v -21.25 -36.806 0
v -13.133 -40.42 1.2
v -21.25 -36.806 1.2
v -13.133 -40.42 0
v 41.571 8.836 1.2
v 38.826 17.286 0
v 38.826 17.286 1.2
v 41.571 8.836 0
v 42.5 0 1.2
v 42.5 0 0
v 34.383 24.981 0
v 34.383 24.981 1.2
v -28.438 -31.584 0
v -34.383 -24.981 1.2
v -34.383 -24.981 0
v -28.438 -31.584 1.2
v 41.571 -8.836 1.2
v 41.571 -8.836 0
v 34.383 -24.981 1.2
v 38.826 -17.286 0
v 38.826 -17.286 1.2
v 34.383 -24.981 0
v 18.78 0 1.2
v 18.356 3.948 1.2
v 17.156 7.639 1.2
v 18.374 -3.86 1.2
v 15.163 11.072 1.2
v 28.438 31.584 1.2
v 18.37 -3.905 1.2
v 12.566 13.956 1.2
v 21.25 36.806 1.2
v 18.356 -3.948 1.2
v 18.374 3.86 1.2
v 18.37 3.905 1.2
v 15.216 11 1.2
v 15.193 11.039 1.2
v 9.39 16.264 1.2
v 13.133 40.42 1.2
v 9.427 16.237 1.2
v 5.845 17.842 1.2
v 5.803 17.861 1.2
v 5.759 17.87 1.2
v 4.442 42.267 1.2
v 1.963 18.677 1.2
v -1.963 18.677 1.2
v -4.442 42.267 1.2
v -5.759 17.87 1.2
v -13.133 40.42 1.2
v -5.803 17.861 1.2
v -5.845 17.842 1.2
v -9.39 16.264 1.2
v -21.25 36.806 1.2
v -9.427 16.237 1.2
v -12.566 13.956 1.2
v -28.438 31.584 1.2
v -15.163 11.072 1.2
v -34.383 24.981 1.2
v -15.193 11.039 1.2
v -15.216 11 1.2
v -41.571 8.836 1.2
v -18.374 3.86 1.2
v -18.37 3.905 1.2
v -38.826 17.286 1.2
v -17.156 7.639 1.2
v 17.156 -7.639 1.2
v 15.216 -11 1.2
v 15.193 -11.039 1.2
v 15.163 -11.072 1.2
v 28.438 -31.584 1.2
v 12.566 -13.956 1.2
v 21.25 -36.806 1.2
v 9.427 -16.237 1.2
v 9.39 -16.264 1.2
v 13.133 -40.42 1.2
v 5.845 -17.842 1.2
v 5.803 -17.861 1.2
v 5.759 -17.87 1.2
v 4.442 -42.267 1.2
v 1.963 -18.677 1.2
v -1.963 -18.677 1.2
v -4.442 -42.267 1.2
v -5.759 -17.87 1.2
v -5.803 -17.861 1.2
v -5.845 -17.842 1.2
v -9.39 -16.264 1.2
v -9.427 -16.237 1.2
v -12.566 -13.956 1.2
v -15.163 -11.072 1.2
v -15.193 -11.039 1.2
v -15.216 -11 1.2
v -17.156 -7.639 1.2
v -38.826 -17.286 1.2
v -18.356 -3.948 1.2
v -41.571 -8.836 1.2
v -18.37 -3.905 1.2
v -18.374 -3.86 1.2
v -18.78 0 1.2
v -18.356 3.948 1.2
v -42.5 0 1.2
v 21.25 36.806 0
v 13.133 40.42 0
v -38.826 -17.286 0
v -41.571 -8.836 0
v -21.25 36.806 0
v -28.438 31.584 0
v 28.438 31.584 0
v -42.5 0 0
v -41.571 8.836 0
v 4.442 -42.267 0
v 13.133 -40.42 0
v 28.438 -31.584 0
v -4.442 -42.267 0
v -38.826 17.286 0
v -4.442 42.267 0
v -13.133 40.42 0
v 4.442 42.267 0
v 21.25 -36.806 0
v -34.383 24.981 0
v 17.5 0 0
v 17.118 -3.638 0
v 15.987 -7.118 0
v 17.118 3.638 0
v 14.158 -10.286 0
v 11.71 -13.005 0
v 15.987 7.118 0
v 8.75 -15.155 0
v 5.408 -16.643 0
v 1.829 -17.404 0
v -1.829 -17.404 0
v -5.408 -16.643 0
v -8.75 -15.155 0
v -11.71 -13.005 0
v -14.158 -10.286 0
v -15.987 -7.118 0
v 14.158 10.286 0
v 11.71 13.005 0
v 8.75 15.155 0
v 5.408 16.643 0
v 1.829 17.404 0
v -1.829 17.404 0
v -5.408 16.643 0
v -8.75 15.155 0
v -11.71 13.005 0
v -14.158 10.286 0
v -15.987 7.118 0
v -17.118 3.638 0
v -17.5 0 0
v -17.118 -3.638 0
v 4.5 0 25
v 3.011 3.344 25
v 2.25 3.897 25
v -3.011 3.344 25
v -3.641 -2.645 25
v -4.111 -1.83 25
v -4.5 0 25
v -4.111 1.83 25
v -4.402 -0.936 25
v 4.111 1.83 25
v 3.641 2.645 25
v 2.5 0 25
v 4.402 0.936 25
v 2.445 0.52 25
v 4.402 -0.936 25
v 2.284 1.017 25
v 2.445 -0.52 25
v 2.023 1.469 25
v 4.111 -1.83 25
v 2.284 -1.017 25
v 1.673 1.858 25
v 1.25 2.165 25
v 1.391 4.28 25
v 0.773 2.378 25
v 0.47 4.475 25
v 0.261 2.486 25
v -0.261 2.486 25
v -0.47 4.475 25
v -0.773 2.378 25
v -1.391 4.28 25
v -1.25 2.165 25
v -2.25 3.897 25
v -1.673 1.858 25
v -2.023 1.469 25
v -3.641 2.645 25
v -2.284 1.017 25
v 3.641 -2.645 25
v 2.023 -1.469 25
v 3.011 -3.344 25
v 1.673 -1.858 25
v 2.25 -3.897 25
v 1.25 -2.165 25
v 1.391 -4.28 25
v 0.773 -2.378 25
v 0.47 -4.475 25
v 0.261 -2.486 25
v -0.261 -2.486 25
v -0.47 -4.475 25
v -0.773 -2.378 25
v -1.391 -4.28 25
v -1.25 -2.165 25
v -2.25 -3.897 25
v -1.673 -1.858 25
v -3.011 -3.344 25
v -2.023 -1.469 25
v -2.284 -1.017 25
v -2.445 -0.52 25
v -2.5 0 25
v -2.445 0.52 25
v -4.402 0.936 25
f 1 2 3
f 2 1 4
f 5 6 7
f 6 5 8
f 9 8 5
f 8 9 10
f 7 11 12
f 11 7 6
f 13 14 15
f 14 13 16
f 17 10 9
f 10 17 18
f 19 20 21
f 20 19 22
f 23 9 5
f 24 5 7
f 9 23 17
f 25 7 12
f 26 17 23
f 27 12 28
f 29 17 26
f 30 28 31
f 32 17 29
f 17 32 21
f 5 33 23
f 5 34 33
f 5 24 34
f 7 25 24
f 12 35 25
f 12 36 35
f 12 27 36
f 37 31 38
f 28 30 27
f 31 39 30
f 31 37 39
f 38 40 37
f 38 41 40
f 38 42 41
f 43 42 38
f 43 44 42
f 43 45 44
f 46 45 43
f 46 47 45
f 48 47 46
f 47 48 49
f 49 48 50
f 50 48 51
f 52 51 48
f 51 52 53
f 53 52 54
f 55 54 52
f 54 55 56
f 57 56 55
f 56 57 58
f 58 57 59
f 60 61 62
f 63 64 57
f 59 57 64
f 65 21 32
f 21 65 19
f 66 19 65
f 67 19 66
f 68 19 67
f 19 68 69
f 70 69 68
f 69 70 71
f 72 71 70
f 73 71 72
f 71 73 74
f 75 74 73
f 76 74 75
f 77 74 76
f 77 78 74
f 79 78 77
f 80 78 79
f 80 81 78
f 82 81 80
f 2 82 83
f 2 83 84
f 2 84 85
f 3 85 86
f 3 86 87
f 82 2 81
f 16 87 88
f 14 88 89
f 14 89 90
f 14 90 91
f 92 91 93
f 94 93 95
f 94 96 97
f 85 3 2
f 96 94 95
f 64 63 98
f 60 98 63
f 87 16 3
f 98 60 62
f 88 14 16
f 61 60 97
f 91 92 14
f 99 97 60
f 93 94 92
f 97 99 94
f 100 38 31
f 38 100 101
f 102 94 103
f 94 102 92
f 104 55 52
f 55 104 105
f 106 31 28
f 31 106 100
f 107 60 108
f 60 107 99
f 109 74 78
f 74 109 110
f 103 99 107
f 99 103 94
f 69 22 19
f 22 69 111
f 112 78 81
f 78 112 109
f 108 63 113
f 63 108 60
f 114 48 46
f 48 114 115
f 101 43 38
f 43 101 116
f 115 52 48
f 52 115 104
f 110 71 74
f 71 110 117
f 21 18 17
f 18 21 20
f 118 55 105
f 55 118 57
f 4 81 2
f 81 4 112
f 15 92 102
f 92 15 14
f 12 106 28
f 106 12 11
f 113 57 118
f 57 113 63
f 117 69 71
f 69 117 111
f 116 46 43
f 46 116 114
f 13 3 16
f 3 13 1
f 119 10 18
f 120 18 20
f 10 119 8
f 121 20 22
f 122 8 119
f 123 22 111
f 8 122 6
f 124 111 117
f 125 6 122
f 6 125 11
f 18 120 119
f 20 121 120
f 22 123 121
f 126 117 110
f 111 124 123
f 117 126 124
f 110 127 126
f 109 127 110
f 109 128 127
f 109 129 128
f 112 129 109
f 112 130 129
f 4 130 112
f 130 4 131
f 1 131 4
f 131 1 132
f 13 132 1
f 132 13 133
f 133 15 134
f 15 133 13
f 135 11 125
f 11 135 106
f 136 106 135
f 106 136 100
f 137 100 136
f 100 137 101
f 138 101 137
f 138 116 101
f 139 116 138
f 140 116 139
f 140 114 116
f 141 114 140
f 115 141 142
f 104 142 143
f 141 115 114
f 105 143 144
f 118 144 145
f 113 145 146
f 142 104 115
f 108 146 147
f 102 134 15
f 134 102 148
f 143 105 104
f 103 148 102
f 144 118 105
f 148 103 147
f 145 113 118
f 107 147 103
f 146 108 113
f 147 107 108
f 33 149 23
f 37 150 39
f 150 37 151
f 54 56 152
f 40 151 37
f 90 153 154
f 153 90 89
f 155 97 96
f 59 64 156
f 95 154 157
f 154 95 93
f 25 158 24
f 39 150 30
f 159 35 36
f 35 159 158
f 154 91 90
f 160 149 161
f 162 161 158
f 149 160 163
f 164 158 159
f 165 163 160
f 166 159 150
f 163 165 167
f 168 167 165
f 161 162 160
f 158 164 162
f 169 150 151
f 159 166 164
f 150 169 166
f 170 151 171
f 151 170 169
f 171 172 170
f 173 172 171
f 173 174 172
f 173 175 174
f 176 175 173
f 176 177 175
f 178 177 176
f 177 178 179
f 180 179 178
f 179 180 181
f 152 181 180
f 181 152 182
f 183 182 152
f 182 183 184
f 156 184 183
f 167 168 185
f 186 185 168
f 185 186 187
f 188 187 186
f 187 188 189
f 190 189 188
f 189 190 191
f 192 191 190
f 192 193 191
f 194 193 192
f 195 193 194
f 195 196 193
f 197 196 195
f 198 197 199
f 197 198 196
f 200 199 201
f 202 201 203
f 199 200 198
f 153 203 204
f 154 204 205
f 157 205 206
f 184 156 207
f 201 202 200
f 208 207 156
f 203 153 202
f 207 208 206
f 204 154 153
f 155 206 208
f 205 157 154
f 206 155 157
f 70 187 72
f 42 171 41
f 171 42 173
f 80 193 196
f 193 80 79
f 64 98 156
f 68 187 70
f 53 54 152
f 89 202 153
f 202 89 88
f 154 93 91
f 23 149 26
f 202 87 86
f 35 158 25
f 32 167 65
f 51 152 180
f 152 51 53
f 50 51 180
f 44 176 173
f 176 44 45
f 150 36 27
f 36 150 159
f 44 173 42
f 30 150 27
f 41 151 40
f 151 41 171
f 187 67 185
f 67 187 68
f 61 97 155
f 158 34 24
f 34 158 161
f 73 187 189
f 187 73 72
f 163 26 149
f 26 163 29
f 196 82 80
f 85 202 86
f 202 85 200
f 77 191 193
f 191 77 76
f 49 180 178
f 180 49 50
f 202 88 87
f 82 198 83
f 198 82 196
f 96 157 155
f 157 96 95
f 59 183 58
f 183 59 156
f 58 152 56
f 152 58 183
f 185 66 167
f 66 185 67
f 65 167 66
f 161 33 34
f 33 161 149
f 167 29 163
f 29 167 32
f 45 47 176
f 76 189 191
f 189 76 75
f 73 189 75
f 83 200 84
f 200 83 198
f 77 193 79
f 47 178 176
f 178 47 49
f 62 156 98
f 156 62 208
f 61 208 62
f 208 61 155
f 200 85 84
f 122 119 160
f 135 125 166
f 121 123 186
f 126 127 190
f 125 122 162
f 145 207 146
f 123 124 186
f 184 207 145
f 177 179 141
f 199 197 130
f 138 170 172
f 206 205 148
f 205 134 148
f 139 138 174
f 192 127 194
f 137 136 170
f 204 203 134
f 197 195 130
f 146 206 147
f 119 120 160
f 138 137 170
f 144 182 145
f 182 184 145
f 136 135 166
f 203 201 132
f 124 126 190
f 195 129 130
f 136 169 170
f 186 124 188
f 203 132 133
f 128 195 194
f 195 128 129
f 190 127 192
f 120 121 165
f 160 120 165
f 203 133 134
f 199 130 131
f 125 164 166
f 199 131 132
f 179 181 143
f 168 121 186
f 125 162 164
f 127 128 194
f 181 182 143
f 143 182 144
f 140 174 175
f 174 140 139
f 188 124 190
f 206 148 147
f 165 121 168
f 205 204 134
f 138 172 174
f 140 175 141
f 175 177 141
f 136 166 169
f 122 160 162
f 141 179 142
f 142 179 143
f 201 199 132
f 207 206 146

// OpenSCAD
//Made putting on a mason jar using the metal ring.

jarSize = 85;
baseThick = 1.2;
coneBase = 35;
coneHeight = 25;
coneHole = 5;
coneThick = 4;

difference(){
	union(){
		cylinder(h=baseThick, d=jarSize);
		cylinder(h=coneHeight, d1=coneBase+coneThick, d2=coneHole+coneThick);
	}
	cylinder(h=coneHeight, d1=coneBase, d2=coneHole);
}
